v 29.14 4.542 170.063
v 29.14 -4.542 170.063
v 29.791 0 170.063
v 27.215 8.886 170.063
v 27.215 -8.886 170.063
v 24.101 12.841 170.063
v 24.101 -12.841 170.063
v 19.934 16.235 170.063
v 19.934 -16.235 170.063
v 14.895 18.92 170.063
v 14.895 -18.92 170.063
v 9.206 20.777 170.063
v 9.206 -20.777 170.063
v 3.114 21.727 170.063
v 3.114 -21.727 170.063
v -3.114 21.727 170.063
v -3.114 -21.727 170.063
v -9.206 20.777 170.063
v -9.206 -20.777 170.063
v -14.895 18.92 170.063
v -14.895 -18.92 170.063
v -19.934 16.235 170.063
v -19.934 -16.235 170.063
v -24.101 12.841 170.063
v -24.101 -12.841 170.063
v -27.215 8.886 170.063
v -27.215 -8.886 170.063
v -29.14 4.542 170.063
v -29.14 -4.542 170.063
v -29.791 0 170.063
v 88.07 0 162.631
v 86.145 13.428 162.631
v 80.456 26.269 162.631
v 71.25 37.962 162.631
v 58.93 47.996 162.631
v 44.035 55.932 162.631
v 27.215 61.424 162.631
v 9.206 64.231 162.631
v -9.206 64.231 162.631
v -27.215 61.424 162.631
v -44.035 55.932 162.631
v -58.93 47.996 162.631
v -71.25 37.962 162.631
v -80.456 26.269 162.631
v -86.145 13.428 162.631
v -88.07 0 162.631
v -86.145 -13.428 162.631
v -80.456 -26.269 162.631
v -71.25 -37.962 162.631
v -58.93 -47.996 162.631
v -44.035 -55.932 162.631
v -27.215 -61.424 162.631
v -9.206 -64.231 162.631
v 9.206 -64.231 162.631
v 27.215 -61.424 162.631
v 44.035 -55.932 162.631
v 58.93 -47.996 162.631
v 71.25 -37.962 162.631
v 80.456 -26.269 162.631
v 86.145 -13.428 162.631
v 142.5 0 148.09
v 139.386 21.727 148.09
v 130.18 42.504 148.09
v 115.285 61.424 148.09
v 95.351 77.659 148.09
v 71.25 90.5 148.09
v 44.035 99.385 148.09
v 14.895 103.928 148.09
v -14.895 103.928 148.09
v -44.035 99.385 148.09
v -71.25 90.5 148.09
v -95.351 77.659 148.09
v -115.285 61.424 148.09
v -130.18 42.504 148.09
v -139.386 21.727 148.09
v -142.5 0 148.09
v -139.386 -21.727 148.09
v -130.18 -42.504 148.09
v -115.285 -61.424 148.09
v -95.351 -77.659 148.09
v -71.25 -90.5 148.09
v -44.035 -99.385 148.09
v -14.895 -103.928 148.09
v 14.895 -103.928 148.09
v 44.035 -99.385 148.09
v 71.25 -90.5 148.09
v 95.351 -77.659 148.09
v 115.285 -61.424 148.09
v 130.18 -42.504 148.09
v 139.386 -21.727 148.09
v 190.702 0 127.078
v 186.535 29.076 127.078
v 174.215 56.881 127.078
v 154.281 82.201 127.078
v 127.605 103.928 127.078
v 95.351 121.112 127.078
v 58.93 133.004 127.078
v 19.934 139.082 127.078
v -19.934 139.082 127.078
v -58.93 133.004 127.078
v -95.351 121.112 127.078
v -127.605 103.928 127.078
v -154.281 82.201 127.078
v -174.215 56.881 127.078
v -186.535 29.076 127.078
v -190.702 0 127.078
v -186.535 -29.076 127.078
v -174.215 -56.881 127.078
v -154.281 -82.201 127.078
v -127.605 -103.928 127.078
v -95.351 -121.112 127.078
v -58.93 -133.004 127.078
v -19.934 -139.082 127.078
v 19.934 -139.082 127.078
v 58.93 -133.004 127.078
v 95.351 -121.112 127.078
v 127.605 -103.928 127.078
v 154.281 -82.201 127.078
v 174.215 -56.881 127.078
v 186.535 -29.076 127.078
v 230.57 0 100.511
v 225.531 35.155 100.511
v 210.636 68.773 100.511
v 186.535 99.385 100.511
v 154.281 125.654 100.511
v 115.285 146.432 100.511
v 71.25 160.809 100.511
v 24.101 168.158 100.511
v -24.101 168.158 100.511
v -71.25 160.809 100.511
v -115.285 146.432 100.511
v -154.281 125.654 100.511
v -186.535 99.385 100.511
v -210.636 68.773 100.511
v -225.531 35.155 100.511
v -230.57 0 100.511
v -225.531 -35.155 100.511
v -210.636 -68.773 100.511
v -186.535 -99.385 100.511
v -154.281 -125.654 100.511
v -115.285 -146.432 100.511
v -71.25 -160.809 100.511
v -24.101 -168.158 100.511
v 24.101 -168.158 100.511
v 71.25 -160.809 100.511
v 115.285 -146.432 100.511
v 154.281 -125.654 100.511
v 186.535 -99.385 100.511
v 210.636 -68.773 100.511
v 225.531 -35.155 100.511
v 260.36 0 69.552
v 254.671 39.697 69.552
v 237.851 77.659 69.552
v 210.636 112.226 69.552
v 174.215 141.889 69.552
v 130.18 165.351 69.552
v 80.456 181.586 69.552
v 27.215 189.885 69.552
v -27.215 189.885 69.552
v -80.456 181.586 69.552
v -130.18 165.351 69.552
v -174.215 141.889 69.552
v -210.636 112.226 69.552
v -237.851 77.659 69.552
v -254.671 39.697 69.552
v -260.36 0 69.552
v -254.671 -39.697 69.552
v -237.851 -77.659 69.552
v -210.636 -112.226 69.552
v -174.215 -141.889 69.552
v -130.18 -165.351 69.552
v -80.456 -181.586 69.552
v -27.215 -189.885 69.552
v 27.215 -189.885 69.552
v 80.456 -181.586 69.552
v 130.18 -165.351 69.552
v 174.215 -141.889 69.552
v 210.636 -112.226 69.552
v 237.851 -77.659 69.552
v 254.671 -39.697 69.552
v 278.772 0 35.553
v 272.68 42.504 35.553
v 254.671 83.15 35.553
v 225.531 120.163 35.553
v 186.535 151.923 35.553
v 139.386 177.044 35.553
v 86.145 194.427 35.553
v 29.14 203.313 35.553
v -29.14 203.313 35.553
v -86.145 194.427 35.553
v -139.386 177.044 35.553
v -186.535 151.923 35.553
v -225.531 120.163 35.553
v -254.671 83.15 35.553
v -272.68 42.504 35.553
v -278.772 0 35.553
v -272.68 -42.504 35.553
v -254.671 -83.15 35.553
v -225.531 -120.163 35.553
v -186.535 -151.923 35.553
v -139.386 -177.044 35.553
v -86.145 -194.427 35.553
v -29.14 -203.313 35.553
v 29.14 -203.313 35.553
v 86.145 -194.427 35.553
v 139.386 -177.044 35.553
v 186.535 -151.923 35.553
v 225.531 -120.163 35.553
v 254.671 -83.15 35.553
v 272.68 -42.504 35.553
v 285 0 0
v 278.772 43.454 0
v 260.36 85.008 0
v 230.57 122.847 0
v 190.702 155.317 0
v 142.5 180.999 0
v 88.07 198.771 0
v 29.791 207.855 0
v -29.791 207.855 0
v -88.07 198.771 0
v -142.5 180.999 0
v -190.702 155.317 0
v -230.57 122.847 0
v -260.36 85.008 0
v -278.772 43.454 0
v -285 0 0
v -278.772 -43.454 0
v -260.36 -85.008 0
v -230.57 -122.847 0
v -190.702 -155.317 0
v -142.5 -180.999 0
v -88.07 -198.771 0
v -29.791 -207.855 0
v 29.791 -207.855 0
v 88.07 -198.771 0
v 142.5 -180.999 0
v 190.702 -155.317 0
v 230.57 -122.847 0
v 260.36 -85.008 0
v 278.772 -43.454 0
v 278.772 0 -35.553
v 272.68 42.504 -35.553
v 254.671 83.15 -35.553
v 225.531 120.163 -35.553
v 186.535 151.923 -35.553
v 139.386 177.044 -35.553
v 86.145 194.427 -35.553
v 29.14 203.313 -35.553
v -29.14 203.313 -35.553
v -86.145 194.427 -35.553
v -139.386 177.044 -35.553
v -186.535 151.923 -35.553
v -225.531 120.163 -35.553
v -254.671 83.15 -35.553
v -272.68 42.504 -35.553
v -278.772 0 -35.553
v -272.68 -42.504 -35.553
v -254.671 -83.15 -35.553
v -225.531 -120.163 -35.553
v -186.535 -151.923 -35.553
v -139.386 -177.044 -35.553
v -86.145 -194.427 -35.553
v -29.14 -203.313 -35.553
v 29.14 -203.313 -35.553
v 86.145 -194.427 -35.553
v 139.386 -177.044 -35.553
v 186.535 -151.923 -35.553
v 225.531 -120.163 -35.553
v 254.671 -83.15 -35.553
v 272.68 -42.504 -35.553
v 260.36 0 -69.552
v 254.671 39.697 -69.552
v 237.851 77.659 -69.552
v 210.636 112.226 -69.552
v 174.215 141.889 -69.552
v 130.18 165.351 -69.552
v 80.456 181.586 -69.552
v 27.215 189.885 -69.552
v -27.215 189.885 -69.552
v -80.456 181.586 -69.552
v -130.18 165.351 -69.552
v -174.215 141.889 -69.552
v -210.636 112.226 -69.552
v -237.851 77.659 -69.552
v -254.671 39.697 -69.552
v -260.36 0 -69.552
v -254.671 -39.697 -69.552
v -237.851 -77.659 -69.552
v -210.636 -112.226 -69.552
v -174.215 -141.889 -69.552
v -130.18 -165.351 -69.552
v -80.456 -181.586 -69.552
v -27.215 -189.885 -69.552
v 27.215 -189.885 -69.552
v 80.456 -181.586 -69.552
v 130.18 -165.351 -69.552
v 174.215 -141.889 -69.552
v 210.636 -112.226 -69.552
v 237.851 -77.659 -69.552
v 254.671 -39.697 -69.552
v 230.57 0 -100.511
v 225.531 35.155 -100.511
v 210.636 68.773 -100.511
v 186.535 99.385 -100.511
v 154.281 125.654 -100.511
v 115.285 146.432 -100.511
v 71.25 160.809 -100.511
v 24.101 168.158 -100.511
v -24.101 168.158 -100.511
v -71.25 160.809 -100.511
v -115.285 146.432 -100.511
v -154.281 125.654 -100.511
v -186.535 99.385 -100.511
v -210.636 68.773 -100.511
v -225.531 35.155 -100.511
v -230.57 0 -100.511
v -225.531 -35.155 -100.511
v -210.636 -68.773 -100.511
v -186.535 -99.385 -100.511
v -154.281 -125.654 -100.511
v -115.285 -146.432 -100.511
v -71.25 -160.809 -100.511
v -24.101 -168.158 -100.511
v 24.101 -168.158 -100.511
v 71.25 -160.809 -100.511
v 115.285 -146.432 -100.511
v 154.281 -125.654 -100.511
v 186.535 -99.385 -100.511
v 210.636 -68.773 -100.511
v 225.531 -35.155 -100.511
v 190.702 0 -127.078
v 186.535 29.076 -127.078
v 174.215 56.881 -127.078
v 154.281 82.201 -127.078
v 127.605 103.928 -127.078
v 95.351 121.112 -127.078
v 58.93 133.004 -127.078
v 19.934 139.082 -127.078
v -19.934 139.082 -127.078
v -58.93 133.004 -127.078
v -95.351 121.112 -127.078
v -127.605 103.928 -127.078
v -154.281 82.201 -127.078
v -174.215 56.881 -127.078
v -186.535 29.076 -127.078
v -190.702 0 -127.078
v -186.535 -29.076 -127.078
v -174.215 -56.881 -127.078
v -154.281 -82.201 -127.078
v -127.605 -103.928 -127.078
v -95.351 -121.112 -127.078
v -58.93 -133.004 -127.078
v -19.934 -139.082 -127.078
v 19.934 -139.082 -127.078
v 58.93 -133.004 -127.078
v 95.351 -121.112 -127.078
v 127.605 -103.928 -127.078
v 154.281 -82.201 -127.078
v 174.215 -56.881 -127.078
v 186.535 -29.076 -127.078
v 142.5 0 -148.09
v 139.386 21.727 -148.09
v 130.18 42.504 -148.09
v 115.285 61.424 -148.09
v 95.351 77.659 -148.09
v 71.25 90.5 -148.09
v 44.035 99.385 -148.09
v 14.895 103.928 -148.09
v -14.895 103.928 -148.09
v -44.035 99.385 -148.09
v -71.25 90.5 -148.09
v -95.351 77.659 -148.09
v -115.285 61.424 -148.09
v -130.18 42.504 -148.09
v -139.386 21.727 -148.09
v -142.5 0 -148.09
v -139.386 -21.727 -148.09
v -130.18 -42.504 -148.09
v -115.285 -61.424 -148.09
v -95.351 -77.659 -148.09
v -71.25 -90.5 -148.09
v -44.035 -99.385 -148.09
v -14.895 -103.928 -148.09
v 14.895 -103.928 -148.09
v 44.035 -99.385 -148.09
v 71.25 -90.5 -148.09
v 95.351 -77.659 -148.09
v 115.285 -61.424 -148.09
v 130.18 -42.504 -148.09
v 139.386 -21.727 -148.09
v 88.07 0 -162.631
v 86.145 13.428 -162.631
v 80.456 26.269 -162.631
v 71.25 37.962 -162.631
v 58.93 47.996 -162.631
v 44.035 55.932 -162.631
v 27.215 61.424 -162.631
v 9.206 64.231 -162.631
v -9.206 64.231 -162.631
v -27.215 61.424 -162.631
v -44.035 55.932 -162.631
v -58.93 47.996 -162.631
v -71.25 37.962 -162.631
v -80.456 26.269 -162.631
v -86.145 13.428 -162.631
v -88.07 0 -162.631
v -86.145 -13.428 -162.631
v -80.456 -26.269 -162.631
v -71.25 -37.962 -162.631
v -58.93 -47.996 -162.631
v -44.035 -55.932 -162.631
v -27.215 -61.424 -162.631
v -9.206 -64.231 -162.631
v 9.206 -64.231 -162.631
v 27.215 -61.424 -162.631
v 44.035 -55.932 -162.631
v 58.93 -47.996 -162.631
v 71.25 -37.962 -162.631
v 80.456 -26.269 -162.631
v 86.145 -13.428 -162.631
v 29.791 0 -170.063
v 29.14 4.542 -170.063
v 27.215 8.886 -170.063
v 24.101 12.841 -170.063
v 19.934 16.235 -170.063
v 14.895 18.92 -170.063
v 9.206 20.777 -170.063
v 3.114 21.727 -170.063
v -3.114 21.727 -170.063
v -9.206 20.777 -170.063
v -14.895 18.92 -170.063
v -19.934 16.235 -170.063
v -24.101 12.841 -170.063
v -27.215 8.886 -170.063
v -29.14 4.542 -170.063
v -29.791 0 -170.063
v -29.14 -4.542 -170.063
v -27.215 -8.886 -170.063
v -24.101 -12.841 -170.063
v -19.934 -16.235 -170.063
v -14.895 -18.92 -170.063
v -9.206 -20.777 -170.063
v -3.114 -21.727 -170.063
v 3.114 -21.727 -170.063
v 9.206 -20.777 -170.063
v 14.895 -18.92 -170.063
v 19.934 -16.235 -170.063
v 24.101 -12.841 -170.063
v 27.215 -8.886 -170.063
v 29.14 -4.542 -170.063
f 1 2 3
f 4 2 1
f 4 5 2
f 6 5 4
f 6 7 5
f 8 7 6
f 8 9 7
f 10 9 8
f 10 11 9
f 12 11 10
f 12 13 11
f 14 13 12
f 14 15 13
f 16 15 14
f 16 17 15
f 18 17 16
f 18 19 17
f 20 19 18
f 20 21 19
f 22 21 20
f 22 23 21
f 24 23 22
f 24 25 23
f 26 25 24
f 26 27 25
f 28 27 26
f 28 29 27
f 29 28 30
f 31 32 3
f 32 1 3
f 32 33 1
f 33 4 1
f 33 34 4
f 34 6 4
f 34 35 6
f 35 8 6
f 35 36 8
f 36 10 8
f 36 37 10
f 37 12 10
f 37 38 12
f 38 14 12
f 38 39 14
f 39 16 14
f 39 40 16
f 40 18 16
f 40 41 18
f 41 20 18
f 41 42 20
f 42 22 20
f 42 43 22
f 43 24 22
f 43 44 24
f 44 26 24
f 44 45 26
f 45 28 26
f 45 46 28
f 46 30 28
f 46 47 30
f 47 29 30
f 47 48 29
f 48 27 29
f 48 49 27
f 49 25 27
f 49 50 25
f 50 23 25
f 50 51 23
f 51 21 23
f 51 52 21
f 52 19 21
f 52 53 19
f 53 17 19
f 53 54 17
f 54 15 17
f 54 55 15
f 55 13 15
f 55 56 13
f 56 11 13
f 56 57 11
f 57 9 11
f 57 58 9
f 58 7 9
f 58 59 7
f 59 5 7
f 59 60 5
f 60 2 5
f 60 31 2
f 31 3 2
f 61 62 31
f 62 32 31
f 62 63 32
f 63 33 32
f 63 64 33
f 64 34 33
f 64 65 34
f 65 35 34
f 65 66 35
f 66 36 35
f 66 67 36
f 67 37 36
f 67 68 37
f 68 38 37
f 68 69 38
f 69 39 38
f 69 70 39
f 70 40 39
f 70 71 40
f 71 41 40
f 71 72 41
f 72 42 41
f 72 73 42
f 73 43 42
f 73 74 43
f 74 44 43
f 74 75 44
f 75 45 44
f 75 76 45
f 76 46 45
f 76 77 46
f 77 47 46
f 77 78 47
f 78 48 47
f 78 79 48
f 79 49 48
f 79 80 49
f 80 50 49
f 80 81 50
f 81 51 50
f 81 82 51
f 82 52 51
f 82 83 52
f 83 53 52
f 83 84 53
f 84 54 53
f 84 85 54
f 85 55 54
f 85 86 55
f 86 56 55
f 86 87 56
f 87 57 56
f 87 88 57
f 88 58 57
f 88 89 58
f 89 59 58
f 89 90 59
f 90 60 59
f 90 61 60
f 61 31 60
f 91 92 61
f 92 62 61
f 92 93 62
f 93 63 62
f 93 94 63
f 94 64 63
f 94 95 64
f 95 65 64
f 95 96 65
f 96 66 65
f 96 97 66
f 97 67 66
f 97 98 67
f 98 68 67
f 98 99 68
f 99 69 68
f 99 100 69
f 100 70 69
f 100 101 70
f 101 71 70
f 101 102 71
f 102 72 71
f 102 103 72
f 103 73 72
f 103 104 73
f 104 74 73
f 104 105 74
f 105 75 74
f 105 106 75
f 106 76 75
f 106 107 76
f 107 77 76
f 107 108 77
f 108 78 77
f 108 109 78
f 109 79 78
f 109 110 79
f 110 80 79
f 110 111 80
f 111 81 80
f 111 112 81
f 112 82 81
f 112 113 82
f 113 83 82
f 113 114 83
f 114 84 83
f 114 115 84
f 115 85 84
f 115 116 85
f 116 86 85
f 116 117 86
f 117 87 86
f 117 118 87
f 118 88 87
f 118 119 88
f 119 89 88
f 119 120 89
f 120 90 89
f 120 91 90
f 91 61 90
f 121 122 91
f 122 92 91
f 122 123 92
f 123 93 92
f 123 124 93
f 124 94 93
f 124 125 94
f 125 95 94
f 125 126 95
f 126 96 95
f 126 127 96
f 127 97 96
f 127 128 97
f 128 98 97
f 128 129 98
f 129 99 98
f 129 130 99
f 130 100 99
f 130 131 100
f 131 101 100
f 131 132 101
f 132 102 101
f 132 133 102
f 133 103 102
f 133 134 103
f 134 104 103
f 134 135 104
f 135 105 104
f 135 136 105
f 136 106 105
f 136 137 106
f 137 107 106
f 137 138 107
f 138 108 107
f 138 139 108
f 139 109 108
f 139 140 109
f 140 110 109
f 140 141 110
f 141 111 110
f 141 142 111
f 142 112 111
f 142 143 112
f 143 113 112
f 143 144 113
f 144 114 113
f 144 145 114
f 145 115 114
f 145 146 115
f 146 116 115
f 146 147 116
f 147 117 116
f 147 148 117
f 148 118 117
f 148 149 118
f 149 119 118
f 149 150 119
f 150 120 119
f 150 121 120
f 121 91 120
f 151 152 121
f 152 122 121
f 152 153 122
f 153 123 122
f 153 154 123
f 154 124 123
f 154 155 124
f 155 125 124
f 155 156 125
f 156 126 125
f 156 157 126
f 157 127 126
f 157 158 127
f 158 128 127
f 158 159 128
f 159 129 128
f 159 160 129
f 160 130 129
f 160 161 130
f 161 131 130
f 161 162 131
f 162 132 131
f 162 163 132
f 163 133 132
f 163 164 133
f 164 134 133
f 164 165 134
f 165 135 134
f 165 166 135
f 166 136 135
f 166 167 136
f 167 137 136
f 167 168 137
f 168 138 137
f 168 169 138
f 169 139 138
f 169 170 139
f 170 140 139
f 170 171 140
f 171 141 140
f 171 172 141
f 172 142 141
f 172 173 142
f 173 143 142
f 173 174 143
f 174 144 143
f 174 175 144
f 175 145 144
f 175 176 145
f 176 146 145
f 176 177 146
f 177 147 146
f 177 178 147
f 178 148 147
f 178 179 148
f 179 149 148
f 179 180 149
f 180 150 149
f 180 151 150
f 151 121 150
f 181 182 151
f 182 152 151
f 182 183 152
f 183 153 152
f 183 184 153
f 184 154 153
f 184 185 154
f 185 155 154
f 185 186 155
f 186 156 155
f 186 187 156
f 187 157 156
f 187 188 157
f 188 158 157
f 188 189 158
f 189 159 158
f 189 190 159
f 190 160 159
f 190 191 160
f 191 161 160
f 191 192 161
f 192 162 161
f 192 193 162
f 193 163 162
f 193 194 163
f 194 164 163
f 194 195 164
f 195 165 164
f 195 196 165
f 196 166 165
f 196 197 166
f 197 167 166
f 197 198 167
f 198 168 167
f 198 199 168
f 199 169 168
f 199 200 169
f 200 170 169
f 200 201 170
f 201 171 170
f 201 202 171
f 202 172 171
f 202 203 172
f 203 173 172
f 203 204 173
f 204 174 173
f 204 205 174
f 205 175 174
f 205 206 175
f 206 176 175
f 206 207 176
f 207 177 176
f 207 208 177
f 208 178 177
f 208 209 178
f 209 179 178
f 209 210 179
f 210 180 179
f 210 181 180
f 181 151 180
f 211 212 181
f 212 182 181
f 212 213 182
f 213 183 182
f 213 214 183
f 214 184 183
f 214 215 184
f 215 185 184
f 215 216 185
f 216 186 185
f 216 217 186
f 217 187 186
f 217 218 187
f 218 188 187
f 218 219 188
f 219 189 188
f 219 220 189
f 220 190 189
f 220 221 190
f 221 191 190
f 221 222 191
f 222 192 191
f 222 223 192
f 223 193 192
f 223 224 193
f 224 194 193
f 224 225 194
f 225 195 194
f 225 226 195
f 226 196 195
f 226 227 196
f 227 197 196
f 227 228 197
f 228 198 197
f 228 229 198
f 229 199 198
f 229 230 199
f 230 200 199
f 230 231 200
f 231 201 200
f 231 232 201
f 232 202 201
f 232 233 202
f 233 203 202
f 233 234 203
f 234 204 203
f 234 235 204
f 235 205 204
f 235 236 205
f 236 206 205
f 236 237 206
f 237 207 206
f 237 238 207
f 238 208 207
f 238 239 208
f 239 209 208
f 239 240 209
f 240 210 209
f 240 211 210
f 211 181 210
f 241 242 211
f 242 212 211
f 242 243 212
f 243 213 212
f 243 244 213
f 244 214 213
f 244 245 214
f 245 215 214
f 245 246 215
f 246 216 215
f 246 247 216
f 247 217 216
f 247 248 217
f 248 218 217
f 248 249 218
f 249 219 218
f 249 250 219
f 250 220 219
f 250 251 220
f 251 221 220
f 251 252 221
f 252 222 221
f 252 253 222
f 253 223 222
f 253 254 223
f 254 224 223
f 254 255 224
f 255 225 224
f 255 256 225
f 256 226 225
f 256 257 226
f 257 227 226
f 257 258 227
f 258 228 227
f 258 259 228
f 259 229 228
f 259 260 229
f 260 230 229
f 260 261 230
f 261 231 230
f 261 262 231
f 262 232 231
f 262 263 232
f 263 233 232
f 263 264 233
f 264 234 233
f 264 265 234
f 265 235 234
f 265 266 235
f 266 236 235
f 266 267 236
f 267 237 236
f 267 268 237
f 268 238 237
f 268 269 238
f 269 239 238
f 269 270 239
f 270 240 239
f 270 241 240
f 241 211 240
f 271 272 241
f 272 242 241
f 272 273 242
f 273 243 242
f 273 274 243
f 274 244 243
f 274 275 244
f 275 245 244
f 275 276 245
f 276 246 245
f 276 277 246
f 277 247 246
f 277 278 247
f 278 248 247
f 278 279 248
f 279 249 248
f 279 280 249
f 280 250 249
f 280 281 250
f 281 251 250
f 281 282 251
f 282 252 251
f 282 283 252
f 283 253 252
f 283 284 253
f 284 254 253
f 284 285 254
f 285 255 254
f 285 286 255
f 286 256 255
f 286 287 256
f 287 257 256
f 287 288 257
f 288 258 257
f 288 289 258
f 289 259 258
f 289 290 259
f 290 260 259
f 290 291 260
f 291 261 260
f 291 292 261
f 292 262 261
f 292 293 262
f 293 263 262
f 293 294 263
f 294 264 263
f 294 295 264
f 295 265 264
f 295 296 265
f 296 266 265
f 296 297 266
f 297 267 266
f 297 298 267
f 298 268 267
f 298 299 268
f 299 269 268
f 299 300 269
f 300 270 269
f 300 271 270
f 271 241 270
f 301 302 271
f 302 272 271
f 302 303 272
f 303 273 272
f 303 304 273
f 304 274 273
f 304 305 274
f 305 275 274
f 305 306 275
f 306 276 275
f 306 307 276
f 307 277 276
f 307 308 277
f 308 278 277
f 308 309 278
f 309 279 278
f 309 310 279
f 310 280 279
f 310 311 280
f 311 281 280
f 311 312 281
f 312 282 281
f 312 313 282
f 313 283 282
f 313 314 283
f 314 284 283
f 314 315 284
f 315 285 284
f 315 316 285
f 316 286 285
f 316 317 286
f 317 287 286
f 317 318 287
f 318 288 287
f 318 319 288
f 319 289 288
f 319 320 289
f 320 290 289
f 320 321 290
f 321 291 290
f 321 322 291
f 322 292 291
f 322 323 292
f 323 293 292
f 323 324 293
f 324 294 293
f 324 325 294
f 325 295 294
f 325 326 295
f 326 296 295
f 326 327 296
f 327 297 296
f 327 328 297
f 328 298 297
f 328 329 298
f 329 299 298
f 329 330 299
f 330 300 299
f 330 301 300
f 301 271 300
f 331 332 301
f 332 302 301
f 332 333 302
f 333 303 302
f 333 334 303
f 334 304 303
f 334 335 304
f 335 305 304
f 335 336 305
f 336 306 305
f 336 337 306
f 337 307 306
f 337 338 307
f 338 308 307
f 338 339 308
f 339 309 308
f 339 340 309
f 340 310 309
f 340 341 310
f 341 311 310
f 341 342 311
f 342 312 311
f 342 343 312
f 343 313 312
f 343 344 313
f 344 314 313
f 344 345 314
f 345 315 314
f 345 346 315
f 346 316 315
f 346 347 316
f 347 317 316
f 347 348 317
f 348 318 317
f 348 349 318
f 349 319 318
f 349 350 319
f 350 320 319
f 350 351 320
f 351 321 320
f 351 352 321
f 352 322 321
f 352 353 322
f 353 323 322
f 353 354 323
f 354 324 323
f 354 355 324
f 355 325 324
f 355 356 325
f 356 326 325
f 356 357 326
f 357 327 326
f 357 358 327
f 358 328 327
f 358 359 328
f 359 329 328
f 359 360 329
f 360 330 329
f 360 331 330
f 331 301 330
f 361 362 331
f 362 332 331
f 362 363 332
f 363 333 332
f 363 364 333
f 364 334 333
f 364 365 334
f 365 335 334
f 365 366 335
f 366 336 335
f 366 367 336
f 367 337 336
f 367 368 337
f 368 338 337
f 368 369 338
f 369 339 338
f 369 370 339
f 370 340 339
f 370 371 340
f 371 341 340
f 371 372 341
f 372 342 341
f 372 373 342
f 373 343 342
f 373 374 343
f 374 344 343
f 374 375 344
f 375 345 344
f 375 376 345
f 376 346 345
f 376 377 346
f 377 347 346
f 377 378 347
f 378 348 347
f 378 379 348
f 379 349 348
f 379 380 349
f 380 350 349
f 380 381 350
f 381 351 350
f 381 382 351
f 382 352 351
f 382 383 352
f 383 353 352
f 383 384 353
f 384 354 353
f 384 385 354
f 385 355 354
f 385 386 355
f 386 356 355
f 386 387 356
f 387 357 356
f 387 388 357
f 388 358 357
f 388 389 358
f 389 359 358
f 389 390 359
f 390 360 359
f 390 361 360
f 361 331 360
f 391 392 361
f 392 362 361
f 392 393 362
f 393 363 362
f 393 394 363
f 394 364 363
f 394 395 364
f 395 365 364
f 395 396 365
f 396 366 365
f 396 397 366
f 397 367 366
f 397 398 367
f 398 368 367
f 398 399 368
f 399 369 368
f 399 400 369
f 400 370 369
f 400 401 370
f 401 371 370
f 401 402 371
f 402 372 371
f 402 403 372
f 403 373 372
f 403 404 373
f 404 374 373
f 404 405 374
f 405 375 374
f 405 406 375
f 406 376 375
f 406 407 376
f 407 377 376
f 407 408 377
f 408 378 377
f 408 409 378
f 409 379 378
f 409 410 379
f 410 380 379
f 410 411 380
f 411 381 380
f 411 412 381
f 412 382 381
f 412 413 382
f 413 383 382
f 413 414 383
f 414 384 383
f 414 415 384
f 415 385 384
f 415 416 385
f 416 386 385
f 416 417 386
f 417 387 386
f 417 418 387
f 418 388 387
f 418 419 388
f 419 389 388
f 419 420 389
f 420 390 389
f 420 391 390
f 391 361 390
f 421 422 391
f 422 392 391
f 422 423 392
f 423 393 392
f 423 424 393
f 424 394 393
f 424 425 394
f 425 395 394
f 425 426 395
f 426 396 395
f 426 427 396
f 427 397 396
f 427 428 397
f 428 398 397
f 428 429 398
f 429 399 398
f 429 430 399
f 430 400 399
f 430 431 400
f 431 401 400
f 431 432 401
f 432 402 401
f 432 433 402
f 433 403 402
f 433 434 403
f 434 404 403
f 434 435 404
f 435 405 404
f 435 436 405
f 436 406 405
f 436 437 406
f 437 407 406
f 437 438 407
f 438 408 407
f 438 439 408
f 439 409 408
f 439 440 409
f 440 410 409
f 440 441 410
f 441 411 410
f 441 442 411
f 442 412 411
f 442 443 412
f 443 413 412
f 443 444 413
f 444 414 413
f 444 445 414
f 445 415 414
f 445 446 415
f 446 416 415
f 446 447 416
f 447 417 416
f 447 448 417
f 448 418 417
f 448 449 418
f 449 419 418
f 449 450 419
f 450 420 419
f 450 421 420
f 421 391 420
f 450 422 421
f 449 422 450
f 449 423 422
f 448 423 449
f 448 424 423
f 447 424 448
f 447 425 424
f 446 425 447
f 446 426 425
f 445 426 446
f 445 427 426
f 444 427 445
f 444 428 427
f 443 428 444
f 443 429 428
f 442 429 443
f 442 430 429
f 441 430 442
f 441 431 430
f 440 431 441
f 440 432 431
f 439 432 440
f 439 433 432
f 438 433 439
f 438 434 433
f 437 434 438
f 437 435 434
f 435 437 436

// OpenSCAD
// Generated by SolidPython 1.0.1 on 2020-07-29 00:46:52


scale(v = [15, 11, 9]) {
	sphere(r = 19);
}
/***********************************************
*********      SolidPython code:      **********
************************************************
 
# import packages: SolidPython
from solid import *
from solid.utils import *
from itertools import chain, combinations, permutations


class Resize:

    def __init__(self, scad_file):
        self.scad_file = scad_file
        #self.scad_file = import_scad(scad_file)
        # cone/cylinder param:
        self.r1 = 0
        self.r2 = 0
        self.h = 0
        # rectangular prism param:
        self.w = 0
        self.l = 0
        # ellipse param:
        self.r = 0

    # import OpenScad code (file name corresponds to shape)


    # classify shape + parameters
    def assign(self, param1, param2, param3):
        if self.scad_file == 'cone.scad':
            self.r1 = param1
            self.r2 = param2
            self.h = param3
        elif self.scad_file == 'cylinder.scad':
            self.r1 = param1
            self.r2 = param2
            self.h = param3
        elif self.scad_file == 'rectangularPrism.scad':
            self.h = param1
            self.l = param2
            self.w = param3
        else:
            self.r = param1
            self.h = param2

    # resize parameters
    def iterate(self):
        x = range(3, 20, 2)
        i = 1
        if self.scad_file == 'cone.scad':
            tempList = list(permutations(x, 2))
            for temp in tempList:
                param1 = temp[0]
                param2 = temp[1]
                filepath = 'produced_scad_files/' + 'cone' + str(param1) + '_' + str(param2) + '_' + '.scad'
                scad_render_to_file(cylinder(h=param1, r1=param2, r2=0), filepath)

        elif self.scad_file == 'cylinder.scad':
            tempList = list(permutations(x, 3))
            for temp in tempList:
                param1 = temp[0]
                param2 = temp[1]
                filepath = 'produced_scad_files/' + 'cylinder' + str(param1) + '_' + str(param2) + '_' + '.scad'
                scad_render_to_file(cylinder(h=param1, r1=param2, r2=param2), filepath)

        elif self.scad_file == 'rectangularPrism.scad':
            tempList = list(permutations(x, 3))
            for temp in tempList:
                param1 = temp[0]
                param2 = temp[1]
                param3 = temp[2]
                filepath = 'produced_scad_files/' + 'rectangularPrism' + str(param1) + '_' + str(param2) + '_' + str(
                    param3) + '.scad'
                scad_render_to_file(cube(size=(param1, param2, param3)), filepath)

        elif self.scad_file == 'ellipse.scad':
            tempList = list(permutations(x, 4))
            for temp in tempList:
                param1 = temp[0]
                param2 = temp[1]
                param3 = temp[2]
                param4 = temp[3]
                filepath = 'produced_scad_files/' + 'ellipse' + str(param1) + '_' + str(param2) + '_' + str(param3) + '_' + str(param4) + '.scad'
                scad_render_to_file(scale([param1, param2, param3])(sphere(r=param4)), filepath)

    def render_to_scadfile(self):
        scad_render_to_file(scad, 'example.scad') 
 
************************************************/
